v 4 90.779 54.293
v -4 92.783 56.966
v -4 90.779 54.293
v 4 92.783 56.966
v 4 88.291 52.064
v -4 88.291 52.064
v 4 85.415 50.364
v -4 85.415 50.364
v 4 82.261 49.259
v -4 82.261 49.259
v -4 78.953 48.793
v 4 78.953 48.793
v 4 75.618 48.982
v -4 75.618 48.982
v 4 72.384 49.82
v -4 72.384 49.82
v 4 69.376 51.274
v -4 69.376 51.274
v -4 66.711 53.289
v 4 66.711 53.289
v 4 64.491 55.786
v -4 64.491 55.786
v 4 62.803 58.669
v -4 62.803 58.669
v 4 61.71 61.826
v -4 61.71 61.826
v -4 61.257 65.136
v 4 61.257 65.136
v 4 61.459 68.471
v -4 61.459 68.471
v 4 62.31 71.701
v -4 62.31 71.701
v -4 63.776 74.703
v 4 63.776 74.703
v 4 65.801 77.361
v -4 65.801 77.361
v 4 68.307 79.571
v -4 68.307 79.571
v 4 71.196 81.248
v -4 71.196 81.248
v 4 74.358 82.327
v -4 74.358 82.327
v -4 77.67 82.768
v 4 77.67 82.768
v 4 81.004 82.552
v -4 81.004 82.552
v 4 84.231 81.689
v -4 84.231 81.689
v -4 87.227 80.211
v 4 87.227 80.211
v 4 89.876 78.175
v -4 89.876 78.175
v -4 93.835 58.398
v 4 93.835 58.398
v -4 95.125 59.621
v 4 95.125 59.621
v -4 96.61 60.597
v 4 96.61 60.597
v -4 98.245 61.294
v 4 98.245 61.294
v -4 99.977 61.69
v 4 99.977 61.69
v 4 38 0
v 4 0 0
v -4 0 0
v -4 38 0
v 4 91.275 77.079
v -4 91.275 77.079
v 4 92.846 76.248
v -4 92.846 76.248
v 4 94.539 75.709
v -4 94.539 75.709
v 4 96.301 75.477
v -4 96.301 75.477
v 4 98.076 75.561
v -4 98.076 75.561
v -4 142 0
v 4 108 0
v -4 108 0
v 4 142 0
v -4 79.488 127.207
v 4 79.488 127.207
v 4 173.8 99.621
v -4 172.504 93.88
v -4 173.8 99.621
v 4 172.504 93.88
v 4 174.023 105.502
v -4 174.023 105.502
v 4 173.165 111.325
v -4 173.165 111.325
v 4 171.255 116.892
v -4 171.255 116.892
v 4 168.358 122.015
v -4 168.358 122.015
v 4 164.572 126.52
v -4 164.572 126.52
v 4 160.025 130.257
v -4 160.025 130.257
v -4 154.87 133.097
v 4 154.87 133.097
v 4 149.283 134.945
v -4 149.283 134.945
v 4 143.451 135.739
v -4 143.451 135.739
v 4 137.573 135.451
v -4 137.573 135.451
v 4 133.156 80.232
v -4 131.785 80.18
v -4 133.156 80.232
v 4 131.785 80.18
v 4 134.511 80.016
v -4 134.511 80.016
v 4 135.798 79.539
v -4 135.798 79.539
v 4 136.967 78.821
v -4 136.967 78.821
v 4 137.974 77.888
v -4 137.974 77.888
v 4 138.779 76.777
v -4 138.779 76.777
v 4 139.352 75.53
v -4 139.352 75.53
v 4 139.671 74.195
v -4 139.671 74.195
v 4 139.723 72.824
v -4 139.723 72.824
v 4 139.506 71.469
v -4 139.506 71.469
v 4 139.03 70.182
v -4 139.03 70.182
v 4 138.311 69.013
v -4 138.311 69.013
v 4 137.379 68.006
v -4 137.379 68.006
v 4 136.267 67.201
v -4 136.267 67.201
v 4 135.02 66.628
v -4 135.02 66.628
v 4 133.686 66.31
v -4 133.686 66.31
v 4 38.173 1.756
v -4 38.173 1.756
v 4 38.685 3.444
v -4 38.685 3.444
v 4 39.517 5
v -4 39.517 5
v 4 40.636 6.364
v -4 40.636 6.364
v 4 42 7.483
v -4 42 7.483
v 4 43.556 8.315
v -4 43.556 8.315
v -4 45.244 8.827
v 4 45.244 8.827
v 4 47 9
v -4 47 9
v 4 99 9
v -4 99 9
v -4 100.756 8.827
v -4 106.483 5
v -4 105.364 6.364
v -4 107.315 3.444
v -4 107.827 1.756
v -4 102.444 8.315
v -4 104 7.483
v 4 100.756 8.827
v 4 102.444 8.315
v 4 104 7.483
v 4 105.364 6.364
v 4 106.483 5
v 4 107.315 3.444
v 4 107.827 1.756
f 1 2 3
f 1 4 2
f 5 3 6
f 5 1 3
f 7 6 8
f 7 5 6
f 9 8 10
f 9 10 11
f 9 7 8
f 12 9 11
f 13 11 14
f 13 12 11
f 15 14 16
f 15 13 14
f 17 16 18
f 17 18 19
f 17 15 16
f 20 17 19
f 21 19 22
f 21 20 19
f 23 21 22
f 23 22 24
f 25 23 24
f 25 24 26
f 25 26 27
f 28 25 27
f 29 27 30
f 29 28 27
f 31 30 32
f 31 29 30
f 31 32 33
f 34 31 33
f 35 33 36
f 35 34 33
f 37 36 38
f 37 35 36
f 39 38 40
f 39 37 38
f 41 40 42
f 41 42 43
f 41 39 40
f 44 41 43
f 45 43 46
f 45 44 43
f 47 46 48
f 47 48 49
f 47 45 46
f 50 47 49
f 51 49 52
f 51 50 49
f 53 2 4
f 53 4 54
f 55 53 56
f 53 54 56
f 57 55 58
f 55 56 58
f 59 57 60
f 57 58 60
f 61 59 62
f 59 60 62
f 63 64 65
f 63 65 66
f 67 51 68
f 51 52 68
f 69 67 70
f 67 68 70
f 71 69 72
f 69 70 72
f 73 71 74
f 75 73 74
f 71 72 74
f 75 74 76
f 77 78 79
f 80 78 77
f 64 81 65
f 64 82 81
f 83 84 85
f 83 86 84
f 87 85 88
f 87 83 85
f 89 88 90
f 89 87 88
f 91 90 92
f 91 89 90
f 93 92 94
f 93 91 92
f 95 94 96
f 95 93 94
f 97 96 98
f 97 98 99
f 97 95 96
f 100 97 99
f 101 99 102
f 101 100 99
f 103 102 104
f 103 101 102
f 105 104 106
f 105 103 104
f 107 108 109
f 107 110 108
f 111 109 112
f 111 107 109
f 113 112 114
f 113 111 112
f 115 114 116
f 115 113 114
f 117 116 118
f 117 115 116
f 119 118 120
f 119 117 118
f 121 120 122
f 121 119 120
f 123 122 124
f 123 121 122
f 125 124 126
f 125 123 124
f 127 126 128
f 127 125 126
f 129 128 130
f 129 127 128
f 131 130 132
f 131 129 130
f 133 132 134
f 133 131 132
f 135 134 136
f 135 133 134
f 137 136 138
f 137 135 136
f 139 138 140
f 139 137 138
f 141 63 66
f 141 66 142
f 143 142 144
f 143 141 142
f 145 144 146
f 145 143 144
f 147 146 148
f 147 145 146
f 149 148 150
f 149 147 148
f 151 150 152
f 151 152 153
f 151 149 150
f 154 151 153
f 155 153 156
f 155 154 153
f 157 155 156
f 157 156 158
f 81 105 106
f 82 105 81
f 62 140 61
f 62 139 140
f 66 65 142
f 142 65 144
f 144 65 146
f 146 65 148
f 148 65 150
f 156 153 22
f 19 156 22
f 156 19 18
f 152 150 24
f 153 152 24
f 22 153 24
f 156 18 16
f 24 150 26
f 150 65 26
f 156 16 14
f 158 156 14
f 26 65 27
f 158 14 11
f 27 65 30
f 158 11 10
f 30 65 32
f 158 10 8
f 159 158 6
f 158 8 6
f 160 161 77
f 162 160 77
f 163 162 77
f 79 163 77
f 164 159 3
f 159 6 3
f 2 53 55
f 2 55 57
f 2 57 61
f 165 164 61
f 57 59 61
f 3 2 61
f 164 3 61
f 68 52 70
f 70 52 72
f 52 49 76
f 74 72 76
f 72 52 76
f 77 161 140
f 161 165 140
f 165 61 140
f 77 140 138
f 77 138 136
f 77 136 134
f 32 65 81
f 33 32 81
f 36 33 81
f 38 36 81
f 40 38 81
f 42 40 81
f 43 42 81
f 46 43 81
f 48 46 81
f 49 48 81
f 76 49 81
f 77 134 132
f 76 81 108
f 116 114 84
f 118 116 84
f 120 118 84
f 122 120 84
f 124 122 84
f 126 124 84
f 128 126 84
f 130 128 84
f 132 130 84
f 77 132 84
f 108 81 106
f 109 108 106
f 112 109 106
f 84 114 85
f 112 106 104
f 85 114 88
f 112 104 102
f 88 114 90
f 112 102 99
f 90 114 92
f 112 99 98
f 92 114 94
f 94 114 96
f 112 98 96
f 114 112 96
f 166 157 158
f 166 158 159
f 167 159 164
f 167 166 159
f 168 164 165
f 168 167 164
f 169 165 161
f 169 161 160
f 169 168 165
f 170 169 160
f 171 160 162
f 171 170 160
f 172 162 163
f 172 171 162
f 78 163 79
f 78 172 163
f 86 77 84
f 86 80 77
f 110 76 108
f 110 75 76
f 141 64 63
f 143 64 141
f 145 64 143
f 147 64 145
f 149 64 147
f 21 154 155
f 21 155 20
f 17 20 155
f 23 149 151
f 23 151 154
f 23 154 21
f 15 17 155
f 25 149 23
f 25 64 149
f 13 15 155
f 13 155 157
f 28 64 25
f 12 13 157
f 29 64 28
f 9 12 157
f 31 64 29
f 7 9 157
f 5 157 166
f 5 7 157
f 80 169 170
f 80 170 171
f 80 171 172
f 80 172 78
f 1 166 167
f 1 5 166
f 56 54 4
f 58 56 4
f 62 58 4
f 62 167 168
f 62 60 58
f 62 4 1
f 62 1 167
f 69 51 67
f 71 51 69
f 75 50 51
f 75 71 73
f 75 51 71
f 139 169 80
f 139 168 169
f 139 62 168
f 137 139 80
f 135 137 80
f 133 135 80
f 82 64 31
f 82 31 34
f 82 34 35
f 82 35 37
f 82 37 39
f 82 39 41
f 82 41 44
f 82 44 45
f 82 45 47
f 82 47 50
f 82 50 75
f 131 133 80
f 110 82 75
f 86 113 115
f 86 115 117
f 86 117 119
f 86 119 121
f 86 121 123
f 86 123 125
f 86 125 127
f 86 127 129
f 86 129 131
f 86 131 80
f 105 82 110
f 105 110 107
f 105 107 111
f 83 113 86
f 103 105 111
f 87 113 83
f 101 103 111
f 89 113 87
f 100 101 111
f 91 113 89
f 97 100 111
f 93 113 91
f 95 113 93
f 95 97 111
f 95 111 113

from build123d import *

# Parameters (mm, degrees)
BOSS_EXTRUDE1_DEPTH = 4
FILLET1_R           = 10


with BuildPart() as part:
    # Sketch1 → Boss-Extrude1 (new, symmetric)
    with BuildSketch(Plane.YZ):
        with BuildLine():
            Line((79.487889635, 127.207214423), (0, 0))
            Line((0, 0), (38, 0))
            ThreePointArc((38, 0), (40.636038969, 6.363961031), (47, 9))
            Line((47, 9), (99, 9))
            ThreePointArc((99, 9), (105.363961031, 6.363961031), (108, 0))
            Line((108, 0), (142, 0))
            Line((142, 0), (172.50354814, 93.880267937))
            ThreePointArc((172.50354814, 93.880267937), (166.569139078, 124.354715336), (137.573015724, 135.451290736))
            Line((137.573015724, 135.451290736), (79.487889635, 127.207214423))
        make_face()
        with BuildLine():
            ThreePointArc((94.543501955, 60.945796393), (61.402056741, 63.469750476), (92.64280616, 74.816173298))
            Line((92.64280616, 74.816173298), (131.785075785, 80.179945877))
            ThreePointArc((131.785075785, 80.179945877), (139.670612135, 74.195105322), (133.68577158, 66.309568971))
            Line((133.68577158, 66.309568971), (94.543501955, 60.945796393))
        make_face(mode=Mode.SUBTRACT)
    extrude(amount=BOSS_EXTRUDE1_DEPTH, both=True)

    # Fillet1
    fillet1_edges = [part.edges().sort_by_distance(p)[0] for p in [
        (0, 92.64280616, 74.816173298),
        (0, 94.543501955, 60.945796393),
    ]]
    fillet(fillet1_edges, radius=FILLET1_R)


solid = part.part
